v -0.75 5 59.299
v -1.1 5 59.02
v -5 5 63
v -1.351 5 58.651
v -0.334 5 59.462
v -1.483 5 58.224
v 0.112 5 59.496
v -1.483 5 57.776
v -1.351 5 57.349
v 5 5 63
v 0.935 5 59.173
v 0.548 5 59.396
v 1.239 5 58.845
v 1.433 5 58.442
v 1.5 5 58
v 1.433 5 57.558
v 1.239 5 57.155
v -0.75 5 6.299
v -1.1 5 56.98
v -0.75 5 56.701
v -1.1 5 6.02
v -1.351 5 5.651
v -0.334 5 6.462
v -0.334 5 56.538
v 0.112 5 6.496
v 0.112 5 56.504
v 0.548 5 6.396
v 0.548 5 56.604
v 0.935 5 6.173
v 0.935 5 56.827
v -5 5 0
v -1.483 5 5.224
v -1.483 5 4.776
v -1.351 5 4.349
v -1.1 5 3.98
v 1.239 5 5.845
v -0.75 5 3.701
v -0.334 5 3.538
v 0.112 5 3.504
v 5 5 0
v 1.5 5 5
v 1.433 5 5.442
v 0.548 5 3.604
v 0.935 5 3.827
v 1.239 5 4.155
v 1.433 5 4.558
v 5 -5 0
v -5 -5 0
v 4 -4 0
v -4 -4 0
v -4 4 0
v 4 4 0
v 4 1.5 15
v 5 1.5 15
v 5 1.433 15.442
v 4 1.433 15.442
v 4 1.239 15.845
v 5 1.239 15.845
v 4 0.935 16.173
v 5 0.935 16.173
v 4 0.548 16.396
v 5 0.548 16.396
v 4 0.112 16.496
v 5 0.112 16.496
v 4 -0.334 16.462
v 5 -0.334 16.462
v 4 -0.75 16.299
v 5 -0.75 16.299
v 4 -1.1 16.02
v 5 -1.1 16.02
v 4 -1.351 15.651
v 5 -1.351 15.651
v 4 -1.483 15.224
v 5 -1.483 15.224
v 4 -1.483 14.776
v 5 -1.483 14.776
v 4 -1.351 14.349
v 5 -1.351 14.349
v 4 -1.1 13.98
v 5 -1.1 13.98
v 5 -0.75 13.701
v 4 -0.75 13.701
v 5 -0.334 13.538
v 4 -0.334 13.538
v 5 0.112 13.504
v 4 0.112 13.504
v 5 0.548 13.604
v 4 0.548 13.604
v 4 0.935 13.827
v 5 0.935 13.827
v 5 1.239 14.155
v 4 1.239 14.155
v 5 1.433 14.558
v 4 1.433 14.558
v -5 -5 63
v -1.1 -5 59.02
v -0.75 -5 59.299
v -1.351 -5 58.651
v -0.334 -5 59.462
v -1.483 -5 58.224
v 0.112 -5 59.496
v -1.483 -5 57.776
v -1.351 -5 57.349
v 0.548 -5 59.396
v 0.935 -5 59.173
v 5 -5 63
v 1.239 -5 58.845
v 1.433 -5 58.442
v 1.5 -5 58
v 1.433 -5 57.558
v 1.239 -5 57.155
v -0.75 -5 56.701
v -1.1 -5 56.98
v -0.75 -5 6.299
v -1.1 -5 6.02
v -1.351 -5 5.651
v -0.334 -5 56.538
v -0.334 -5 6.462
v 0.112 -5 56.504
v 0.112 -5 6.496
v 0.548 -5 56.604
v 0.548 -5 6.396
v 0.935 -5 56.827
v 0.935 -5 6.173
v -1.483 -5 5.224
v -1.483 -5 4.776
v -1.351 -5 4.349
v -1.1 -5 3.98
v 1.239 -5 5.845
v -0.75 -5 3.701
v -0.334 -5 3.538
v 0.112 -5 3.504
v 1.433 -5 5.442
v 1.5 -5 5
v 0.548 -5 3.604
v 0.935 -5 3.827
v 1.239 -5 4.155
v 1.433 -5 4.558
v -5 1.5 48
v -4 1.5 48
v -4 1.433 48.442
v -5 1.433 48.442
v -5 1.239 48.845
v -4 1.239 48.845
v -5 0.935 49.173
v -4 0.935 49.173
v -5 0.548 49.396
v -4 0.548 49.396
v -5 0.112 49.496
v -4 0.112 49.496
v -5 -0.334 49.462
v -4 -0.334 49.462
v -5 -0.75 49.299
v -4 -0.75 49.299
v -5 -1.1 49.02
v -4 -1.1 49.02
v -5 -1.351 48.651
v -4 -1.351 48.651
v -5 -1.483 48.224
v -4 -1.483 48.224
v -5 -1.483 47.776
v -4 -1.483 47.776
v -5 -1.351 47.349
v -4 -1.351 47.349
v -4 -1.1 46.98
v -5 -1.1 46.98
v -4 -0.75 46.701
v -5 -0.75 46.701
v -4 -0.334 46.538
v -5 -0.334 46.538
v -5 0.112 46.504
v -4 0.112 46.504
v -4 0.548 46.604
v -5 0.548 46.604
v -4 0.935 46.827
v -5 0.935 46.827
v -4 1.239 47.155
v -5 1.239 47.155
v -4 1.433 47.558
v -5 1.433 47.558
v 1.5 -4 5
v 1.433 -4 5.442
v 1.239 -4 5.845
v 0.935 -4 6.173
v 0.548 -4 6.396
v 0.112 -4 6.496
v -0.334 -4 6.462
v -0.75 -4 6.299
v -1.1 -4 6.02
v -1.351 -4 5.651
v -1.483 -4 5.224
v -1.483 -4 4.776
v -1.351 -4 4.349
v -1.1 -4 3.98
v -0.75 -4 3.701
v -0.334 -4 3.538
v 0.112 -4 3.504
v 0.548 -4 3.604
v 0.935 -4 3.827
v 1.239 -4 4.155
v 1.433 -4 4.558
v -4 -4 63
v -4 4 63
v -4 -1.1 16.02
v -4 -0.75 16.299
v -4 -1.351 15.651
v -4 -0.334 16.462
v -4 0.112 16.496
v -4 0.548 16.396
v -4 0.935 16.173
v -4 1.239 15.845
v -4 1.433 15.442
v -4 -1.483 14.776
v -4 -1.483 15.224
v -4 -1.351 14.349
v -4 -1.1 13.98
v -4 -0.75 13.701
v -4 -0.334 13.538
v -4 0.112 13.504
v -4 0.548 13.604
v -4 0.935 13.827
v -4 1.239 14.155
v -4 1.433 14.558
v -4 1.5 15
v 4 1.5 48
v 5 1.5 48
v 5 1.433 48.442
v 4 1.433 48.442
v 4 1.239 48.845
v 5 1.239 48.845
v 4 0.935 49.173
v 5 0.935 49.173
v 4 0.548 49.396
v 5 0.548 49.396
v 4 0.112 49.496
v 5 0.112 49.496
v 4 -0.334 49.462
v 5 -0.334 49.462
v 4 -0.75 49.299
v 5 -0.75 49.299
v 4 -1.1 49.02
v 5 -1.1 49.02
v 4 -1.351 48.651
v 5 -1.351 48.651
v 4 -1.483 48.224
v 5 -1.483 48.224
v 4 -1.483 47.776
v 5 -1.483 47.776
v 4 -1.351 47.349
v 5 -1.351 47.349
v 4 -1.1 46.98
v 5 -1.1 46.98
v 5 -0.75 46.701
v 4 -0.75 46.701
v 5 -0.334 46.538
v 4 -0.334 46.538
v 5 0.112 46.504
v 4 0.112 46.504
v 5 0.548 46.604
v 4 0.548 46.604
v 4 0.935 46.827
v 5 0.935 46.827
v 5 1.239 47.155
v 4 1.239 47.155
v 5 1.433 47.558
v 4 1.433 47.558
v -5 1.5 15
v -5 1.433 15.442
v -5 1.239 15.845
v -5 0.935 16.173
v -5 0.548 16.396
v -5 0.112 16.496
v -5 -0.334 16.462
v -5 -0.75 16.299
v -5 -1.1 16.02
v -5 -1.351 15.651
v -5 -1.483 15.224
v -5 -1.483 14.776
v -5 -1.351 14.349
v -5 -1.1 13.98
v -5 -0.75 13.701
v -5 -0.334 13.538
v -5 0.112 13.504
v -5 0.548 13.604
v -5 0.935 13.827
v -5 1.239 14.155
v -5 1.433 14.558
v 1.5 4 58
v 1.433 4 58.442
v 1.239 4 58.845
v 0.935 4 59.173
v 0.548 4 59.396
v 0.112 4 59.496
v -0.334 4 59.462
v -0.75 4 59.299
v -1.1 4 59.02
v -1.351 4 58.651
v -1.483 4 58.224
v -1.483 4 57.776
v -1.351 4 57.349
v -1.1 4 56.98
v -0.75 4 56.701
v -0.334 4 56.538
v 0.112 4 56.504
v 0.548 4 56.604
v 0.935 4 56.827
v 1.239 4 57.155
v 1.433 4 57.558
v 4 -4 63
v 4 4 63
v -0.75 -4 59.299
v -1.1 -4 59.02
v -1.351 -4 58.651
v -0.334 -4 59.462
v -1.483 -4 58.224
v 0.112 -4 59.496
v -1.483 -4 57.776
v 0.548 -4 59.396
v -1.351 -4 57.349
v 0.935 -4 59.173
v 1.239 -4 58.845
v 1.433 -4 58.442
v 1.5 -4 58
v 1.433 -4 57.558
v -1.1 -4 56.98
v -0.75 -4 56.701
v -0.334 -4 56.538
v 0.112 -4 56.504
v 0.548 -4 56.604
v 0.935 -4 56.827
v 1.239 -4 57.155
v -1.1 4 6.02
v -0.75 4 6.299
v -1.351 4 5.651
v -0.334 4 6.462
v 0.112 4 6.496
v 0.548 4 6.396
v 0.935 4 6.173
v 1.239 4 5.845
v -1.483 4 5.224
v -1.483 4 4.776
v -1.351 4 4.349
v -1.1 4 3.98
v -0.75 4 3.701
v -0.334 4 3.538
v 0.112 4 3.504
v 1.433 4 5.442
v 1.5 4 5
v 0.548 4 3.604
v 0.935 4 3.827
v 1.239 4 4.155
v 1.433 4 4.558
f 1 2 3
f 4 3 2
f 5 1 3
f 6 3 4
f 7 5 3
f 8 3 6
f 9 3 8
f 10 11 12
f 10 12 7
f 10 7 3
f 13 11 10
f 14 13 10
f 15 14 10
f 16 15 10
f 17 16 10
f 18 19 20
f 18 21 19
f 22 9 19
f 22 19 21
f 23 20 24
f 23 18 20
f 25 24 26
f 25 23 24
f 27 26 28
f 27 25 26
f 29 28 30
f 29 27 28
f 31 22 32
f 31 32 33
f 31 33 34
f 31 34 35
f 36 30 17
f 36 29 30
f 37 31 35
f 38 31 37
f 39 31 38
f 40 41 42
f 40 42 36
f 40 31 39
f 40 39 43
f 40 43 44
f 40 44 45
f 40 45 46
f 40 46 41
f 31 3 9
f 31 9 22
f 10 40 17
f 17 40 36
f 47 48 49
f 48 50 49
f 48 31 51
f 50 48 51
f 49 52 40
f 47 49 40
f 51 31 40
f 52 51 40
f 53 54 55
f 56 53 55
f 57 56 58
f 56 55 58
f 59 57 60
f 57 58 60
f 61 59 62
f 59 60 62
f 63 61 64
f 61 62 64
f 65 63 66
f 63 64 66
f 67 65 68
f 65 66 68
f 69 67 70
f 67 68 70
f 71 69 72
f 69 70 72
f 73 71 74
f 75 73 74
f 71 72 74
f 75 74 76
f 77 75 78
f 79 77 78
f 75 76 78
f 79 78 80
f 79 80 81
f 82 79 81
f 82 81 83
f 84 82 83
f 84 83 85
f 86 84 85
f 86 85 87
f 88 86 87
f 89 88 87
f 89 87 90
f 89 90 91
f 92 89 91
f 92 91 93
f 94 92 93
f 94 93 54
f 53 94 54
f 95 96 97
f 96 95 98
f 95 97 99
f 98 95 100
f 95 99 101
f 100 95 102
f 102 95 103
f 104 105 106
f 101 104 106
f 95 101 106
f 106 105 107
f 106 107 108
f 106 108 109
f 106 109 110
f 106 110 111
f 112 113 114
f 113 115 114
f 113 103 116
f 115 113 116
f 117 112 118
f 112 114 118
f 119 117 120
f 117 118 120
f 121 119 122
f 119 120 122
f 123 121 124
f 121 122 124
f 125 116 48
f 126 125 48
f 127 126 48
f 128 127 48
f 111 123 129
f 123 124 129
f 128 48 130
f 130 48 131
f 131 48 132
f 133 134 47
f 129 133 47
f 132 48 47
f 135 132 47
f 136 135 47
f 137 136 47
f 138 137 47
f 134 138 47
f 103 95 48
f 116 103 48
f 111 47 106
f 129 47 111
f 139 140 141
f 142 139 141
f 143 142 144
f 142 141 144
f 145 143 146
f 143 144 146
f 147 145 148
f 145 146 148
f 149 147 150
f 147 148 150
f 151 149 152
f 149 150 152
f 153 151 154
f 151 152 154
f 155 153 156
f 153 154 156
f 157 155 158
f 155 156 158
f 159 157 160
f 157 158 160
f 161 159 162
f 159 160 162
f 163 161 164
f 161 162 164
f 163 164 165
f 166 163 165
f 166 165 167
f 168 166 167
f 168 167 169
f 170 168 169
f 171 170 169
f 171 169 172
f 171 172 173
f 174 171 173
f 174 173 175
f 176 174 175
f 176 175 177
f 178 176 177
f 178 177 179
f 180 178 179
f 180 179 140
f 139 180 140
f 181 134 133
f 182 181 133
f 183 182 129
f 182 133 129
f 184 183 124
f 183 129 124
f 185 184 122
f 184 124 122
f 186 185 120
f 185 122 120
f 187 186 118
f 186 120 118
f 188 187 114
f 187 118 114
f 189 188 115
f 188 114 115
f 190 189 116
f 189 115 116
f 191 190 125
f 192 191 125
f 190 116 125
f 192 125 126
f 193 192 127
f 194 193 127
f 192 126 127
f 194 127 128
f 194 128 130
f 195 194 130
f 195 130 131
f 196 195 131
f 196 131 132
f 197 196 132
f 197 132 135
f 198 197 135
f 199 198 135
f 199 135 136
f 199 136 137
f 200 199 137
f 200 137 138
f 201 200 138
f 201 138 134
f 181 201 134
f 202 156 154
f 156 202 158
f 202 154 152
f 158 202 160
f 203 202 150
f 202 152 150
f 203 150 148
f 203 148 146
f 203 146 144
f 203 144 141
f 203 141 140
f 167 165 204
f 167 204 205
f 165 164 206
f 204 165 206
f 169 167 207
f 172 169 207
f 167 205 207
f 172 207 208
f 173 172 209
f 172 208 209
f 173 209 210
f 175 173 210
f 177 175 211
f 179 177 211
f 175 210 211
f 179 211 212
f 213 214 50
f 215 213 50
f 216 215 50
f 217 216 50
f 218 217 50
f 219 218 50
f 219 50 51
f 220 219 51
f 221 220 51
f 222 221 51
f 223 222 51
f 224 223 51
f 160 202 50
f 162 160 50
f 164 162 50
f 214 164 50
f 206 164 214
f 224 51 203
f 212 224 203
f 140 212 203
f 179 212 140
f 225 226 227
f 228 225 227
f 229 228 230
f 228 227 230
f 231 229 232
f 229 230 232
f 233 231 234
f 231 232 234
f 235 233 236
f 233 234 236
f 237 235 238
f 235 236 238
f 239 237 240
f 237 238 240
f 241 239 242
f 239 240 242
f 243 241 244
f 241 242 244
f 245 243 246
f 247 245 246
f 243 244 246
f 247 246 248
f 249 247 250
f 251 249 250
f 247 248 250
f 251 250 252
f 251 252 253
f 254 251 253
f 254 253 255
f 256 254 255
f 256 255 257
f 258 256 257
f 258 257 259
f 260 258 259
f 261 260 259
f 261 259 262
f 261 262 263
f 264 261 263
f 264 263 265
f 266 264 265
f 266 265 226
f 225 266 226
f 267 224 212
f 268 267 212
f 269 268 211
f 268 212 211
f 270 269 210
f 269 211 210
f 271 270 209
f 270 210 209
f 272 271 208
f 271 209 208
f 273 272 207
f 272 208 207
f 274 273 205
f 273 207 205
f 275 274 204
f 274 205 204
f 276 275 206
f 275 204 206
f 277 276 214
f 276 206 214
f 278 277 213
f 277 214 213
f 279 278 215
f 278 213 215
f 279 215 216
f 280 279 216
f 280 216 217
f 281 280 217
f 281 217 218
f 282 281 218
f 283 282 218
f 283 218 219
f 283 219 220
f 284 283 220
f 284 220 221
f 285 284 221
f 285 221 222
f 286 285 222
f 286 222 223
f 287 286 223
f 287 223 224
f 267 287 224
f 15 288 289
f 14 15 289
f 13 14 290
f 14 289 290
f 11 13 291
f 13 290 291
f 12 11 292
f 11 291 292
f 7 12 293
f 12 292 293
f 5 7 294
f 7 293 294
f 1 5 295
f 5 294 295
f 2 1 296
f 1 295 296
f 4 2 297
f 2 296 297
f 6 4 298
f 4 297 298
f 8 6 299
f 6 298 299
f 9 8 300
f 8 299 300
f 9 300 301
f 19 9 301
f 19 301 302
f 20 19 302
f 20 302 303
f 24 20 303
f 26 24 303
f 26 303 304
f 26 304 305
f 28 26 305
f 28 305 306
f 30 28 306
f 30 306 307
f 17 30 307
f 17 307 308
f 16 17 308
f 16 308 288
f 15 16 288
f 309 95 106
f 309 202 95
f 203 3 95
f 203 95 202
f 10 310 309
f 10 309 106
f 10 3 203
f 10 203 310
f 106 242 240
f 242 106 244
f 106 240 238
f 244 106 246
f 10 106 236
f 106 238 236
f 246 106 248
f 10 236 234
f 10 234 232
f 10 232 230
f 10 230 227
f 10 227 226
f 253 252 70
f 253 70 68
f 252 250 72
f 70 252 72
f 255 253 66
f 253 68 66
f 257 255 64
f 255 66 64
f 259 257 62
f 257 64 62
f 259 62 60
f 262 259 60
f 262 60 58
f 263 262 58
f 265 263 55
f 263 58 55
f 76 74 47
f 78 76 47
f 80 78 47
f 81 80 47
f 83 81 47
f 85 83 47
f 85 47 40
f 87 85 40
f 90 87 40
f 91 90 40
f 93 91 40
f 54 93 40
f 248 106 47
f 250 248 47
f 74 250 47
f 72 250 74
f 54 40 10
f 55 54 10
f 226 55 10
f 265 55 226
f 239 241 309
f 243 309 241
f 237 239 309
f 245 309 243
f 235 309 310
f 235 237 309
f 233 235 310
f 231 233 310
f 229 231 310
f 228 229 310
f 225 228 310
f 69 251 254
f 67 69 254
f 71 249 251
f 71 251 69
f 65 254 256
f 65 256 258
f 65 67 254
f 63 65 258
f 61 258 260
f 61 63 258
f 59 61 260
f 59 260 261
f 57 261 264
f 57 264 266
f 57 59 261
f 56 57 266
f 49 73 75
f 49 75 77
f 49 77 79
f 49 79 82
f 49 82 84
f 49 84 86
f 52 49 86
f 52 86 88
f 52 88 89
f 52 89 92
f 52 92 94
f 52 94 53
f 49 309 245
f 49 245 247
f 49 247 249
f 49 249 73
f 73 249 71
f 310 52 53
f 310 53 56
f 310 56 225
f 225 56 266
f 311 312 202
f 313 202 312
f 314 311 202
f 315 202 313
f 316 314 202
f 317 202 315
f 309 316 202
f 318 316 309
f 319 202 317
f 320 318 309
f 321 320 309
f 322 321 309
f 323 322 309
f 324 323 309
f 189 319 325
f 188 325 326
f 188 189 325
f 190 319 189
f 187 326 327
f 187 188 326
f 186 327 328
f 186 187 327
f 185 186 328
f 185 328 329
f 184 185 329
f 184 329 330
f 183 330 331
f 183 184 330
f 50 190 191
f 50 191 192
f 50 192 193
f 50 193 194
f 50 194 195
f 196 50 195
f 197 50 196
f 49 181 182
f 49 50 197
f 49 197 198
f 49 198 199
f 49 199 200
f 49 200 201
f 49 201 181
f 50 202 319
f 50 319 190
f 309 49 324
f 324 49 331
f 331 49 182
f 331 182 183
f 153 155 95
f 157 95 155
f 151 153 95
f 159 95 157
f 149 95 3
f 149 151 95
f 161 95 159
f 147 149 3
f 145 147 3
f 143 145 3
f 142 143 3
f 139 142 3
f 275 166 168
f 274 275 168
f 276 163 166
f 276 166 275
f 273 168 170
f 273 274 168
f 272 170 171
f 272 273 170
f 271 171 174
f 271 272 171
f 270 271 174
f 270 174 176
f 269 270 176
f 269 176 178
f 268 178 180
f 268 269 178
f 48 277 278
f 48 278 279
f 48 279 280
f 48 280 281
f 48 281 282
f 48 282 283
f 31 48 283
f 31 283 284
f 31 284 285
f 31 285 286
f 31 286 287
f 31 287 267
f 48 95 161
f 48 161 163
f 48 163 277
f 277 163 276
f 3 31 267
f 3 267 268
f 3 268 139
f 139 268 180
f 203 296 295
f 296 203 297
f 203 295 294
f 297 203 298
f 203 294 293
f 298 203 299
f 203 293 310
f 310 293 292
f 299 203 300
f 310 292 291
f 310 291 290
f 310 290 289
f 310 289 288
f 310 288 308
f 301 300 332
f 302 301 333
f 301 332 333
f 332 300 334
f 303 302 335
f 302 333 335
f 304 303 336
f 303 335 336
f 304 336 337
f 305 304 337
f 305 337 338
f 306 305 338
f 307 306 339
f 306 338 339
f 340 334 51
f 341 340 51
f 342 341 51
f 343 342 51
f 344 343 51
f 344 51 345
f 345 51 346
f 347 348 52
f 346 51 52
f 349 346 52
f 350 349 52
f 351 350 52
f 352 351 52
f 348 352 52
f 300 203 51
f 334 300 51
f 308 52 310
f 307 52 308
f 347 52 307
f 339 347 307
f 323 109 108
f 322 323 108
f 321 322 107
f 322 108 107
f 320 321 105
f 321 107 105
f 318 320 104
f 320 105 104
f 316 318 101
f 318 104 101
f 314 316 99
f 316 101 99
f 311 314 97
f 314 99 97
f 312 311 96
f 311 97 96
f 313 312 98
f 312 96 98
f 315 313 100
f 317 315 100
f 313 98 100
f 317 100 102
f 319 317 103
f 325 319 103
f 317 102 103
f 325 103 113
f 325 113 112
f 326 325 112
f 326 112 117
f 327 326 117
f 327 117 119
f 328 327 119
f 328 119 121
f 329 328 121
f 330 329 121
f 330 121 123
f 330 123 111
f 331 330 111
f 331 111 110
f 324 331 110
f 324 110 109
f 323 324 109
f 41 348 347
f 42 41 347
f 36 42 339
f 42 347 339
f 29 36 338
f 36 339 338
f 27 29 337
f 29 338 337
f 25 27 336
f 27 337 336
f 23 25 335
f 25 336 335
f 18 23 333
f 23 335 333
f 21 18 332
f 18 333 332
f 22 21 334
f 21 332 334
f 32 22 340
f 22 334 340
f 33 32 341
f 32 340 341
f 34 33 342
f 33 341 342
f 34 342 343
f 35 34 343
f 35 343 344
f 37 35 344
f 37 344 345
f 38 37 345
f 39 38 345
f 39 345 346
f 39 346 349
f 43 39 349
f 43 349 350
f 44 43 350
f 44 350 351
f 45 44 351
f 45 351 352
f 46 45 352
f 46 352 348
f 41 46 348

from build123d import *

# Parameters (mm, degrees)
F0_W     = 10
F0_H     = 10
F0_W_2   = 8
F0_H_2   = 8
F1_DEPTH = 63
F2_R     = 1.5
F3_DEPTH = 25
F4_R     = 1.5
F5_DEPTH = 25


with BuildPart() as f1:
    # F0 (on Top) → F1 (new body)
    with BuildSketch(Plane.XY):
        Rectangle(F0_W, F0_H)
        Rectangle(F0_W_2, F0_H_2, mode=Mode.SUBTRACT)
    extrude(amount=F1_DEPTH)

    # F2 (on face) → F3 (cut)
    with BuildSketch(Plane.XZ.offset(5)):
        with Locations((0, 5)):
            Circle(F2_R)
        with Locations((0, 58)):
            Circle(F2_R)
    extrude(amount=-F3_DEPTH, mode=Mode.SUBTRACT)

    # F4 (on face) → F5 (cut)
    with BuildSketch(Plane.YZ.offset(5)):
        with Locations((0, 48)):
            Circle(F4_R)
        with Locations((0, 15)):
            Circle(F4_R)
    extrude(amount=-F5_DEPTH, mode=Mode.SUBTRACT)


solid = f1.part
